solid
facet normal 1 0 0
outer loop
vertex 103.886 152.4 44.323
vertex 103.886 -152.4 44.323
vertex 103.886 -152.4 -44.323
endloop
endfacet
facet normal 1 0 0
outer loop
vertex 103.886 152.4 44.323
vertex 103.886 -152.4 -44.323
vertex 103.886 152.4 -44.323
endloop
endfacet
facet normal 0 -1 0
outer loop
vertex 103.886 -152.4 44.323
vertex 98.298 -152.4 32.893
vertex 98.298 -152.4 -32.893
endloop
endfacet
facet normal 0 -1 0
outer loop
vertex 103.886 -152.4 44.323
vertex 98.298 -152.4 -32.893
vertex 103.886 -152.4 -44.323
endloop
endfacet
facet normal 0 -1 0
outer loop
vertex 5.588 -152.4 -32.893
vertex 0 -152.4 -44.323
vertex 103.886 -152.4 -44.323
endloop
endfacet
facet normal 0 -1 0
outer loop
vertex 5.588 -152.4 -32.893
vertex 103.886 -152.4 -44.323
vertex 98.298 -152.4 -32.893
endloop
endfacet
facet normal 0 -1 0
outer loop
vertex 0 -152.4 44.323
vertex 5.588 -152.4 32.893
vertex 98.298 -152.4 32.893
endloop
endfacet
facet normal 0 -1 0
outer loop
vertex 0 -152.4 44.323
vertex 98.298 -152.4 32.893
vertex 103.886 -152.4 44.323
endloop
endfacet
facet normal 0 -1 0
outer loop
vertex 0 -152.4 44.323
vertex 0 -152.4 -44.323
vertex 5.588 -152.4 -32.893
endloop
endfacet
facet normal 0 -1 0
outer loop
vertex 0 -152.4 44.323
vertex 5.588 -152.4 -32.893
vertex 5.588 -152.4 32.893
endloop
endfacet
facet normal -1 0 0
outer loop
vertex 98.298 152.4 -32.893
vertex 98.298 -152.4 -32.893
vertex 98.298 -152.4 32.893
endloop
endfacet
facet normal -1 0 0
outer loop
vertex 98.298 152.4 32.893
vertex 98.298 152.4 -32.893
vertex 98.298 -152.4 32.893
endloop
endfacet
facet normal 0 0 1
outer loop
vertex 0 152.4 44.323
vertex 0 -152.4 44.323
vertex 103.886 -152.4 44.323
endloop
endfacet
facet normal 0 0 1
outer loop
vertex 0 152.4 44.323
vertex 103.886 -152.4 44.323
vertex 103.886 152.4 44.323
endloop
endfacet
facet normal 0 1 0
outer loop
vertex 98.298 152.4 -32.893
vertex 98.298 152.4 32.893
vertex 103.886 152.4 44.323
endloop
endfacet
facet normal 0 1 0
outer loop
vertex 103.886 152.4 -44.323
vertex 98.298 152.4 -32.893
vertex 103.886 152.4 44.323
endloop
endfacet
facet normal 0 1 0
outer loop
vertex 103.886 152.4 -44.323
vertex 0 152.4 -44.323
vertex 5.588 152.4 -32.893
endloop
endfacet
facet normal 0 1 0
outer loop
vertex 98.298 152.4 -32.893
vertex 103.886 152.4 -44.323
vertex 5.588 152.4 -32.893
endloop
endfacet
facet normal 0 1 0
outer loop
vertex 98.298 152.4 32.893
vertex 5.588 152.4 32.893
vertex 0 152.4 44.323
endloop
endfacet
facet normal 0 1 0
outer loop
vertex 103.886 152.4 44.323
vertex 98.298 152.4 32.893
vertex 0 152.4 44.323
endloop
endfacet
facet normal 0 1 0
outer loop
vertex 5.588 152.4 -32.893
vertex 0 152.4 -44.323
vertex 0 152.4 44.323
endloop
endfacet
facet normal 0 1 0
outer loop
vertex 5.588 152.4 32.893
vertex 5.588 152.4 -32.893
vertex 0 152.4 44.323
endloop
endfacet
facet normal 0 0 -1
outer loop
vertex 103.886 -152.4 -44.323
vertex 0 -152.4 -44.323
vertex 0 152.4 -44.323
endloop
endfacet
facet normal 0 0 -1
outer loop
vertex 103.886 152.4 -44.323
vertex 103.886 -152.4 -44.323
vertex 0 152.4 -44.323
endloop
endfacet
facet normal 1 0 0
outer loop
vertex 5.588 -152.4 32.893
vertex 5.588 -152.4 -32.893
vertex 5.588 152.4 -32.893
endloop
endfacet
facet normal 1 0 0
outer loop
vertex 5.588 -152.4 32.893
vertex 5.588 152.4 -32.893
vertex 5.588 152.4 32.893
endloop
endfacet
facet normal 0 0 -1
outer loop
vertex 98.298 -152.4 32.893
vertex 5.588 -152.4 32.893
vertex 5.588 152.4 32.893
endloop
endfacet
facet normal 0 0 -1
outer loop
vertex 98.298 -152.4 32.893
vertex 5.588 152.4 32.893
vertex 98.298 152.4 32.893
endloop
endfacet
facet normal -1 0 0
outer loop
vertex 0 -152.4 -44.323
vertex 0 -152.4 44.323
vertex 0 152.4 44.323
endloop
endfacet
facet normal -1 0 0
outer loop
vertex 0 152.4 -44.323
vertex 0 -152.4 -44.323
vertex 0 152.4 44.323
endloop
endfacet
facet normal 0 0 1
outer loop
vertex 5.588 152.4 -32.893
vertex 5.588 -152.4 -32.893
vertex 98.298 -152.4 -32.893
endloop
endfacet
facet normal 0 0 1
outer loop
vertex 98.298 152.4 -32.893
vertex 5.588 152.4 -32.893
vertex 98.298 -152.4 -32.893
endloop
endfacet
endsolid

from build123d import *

# Parameters (mm, degrees)
F0_W     = 304.8
F0_H     = 88.646
F1_DEPTH = 103.886
F3_W     = 92.71
F3_H     = 65.786
F4_DEPTH = 1270


with BuildPart() as f1:
    # F0 (on Right) → F1 (new body)
    with BuildSketch(Plane.YZ):
        Rectangle(F0_W, F0_H)
    extrude(amount=F1_DEPTH)

    # F3 (on face) → F4 (cut)
    with BuildSketch(Plane.XZ.offset(152.4)):
        with Locations((51.943, 0)):
            Rectangle(F3_W, F3_H)
    extrude(amount=-F4_DEPTH, mode=Mode.SUBTRACT)


solid = f1.part
